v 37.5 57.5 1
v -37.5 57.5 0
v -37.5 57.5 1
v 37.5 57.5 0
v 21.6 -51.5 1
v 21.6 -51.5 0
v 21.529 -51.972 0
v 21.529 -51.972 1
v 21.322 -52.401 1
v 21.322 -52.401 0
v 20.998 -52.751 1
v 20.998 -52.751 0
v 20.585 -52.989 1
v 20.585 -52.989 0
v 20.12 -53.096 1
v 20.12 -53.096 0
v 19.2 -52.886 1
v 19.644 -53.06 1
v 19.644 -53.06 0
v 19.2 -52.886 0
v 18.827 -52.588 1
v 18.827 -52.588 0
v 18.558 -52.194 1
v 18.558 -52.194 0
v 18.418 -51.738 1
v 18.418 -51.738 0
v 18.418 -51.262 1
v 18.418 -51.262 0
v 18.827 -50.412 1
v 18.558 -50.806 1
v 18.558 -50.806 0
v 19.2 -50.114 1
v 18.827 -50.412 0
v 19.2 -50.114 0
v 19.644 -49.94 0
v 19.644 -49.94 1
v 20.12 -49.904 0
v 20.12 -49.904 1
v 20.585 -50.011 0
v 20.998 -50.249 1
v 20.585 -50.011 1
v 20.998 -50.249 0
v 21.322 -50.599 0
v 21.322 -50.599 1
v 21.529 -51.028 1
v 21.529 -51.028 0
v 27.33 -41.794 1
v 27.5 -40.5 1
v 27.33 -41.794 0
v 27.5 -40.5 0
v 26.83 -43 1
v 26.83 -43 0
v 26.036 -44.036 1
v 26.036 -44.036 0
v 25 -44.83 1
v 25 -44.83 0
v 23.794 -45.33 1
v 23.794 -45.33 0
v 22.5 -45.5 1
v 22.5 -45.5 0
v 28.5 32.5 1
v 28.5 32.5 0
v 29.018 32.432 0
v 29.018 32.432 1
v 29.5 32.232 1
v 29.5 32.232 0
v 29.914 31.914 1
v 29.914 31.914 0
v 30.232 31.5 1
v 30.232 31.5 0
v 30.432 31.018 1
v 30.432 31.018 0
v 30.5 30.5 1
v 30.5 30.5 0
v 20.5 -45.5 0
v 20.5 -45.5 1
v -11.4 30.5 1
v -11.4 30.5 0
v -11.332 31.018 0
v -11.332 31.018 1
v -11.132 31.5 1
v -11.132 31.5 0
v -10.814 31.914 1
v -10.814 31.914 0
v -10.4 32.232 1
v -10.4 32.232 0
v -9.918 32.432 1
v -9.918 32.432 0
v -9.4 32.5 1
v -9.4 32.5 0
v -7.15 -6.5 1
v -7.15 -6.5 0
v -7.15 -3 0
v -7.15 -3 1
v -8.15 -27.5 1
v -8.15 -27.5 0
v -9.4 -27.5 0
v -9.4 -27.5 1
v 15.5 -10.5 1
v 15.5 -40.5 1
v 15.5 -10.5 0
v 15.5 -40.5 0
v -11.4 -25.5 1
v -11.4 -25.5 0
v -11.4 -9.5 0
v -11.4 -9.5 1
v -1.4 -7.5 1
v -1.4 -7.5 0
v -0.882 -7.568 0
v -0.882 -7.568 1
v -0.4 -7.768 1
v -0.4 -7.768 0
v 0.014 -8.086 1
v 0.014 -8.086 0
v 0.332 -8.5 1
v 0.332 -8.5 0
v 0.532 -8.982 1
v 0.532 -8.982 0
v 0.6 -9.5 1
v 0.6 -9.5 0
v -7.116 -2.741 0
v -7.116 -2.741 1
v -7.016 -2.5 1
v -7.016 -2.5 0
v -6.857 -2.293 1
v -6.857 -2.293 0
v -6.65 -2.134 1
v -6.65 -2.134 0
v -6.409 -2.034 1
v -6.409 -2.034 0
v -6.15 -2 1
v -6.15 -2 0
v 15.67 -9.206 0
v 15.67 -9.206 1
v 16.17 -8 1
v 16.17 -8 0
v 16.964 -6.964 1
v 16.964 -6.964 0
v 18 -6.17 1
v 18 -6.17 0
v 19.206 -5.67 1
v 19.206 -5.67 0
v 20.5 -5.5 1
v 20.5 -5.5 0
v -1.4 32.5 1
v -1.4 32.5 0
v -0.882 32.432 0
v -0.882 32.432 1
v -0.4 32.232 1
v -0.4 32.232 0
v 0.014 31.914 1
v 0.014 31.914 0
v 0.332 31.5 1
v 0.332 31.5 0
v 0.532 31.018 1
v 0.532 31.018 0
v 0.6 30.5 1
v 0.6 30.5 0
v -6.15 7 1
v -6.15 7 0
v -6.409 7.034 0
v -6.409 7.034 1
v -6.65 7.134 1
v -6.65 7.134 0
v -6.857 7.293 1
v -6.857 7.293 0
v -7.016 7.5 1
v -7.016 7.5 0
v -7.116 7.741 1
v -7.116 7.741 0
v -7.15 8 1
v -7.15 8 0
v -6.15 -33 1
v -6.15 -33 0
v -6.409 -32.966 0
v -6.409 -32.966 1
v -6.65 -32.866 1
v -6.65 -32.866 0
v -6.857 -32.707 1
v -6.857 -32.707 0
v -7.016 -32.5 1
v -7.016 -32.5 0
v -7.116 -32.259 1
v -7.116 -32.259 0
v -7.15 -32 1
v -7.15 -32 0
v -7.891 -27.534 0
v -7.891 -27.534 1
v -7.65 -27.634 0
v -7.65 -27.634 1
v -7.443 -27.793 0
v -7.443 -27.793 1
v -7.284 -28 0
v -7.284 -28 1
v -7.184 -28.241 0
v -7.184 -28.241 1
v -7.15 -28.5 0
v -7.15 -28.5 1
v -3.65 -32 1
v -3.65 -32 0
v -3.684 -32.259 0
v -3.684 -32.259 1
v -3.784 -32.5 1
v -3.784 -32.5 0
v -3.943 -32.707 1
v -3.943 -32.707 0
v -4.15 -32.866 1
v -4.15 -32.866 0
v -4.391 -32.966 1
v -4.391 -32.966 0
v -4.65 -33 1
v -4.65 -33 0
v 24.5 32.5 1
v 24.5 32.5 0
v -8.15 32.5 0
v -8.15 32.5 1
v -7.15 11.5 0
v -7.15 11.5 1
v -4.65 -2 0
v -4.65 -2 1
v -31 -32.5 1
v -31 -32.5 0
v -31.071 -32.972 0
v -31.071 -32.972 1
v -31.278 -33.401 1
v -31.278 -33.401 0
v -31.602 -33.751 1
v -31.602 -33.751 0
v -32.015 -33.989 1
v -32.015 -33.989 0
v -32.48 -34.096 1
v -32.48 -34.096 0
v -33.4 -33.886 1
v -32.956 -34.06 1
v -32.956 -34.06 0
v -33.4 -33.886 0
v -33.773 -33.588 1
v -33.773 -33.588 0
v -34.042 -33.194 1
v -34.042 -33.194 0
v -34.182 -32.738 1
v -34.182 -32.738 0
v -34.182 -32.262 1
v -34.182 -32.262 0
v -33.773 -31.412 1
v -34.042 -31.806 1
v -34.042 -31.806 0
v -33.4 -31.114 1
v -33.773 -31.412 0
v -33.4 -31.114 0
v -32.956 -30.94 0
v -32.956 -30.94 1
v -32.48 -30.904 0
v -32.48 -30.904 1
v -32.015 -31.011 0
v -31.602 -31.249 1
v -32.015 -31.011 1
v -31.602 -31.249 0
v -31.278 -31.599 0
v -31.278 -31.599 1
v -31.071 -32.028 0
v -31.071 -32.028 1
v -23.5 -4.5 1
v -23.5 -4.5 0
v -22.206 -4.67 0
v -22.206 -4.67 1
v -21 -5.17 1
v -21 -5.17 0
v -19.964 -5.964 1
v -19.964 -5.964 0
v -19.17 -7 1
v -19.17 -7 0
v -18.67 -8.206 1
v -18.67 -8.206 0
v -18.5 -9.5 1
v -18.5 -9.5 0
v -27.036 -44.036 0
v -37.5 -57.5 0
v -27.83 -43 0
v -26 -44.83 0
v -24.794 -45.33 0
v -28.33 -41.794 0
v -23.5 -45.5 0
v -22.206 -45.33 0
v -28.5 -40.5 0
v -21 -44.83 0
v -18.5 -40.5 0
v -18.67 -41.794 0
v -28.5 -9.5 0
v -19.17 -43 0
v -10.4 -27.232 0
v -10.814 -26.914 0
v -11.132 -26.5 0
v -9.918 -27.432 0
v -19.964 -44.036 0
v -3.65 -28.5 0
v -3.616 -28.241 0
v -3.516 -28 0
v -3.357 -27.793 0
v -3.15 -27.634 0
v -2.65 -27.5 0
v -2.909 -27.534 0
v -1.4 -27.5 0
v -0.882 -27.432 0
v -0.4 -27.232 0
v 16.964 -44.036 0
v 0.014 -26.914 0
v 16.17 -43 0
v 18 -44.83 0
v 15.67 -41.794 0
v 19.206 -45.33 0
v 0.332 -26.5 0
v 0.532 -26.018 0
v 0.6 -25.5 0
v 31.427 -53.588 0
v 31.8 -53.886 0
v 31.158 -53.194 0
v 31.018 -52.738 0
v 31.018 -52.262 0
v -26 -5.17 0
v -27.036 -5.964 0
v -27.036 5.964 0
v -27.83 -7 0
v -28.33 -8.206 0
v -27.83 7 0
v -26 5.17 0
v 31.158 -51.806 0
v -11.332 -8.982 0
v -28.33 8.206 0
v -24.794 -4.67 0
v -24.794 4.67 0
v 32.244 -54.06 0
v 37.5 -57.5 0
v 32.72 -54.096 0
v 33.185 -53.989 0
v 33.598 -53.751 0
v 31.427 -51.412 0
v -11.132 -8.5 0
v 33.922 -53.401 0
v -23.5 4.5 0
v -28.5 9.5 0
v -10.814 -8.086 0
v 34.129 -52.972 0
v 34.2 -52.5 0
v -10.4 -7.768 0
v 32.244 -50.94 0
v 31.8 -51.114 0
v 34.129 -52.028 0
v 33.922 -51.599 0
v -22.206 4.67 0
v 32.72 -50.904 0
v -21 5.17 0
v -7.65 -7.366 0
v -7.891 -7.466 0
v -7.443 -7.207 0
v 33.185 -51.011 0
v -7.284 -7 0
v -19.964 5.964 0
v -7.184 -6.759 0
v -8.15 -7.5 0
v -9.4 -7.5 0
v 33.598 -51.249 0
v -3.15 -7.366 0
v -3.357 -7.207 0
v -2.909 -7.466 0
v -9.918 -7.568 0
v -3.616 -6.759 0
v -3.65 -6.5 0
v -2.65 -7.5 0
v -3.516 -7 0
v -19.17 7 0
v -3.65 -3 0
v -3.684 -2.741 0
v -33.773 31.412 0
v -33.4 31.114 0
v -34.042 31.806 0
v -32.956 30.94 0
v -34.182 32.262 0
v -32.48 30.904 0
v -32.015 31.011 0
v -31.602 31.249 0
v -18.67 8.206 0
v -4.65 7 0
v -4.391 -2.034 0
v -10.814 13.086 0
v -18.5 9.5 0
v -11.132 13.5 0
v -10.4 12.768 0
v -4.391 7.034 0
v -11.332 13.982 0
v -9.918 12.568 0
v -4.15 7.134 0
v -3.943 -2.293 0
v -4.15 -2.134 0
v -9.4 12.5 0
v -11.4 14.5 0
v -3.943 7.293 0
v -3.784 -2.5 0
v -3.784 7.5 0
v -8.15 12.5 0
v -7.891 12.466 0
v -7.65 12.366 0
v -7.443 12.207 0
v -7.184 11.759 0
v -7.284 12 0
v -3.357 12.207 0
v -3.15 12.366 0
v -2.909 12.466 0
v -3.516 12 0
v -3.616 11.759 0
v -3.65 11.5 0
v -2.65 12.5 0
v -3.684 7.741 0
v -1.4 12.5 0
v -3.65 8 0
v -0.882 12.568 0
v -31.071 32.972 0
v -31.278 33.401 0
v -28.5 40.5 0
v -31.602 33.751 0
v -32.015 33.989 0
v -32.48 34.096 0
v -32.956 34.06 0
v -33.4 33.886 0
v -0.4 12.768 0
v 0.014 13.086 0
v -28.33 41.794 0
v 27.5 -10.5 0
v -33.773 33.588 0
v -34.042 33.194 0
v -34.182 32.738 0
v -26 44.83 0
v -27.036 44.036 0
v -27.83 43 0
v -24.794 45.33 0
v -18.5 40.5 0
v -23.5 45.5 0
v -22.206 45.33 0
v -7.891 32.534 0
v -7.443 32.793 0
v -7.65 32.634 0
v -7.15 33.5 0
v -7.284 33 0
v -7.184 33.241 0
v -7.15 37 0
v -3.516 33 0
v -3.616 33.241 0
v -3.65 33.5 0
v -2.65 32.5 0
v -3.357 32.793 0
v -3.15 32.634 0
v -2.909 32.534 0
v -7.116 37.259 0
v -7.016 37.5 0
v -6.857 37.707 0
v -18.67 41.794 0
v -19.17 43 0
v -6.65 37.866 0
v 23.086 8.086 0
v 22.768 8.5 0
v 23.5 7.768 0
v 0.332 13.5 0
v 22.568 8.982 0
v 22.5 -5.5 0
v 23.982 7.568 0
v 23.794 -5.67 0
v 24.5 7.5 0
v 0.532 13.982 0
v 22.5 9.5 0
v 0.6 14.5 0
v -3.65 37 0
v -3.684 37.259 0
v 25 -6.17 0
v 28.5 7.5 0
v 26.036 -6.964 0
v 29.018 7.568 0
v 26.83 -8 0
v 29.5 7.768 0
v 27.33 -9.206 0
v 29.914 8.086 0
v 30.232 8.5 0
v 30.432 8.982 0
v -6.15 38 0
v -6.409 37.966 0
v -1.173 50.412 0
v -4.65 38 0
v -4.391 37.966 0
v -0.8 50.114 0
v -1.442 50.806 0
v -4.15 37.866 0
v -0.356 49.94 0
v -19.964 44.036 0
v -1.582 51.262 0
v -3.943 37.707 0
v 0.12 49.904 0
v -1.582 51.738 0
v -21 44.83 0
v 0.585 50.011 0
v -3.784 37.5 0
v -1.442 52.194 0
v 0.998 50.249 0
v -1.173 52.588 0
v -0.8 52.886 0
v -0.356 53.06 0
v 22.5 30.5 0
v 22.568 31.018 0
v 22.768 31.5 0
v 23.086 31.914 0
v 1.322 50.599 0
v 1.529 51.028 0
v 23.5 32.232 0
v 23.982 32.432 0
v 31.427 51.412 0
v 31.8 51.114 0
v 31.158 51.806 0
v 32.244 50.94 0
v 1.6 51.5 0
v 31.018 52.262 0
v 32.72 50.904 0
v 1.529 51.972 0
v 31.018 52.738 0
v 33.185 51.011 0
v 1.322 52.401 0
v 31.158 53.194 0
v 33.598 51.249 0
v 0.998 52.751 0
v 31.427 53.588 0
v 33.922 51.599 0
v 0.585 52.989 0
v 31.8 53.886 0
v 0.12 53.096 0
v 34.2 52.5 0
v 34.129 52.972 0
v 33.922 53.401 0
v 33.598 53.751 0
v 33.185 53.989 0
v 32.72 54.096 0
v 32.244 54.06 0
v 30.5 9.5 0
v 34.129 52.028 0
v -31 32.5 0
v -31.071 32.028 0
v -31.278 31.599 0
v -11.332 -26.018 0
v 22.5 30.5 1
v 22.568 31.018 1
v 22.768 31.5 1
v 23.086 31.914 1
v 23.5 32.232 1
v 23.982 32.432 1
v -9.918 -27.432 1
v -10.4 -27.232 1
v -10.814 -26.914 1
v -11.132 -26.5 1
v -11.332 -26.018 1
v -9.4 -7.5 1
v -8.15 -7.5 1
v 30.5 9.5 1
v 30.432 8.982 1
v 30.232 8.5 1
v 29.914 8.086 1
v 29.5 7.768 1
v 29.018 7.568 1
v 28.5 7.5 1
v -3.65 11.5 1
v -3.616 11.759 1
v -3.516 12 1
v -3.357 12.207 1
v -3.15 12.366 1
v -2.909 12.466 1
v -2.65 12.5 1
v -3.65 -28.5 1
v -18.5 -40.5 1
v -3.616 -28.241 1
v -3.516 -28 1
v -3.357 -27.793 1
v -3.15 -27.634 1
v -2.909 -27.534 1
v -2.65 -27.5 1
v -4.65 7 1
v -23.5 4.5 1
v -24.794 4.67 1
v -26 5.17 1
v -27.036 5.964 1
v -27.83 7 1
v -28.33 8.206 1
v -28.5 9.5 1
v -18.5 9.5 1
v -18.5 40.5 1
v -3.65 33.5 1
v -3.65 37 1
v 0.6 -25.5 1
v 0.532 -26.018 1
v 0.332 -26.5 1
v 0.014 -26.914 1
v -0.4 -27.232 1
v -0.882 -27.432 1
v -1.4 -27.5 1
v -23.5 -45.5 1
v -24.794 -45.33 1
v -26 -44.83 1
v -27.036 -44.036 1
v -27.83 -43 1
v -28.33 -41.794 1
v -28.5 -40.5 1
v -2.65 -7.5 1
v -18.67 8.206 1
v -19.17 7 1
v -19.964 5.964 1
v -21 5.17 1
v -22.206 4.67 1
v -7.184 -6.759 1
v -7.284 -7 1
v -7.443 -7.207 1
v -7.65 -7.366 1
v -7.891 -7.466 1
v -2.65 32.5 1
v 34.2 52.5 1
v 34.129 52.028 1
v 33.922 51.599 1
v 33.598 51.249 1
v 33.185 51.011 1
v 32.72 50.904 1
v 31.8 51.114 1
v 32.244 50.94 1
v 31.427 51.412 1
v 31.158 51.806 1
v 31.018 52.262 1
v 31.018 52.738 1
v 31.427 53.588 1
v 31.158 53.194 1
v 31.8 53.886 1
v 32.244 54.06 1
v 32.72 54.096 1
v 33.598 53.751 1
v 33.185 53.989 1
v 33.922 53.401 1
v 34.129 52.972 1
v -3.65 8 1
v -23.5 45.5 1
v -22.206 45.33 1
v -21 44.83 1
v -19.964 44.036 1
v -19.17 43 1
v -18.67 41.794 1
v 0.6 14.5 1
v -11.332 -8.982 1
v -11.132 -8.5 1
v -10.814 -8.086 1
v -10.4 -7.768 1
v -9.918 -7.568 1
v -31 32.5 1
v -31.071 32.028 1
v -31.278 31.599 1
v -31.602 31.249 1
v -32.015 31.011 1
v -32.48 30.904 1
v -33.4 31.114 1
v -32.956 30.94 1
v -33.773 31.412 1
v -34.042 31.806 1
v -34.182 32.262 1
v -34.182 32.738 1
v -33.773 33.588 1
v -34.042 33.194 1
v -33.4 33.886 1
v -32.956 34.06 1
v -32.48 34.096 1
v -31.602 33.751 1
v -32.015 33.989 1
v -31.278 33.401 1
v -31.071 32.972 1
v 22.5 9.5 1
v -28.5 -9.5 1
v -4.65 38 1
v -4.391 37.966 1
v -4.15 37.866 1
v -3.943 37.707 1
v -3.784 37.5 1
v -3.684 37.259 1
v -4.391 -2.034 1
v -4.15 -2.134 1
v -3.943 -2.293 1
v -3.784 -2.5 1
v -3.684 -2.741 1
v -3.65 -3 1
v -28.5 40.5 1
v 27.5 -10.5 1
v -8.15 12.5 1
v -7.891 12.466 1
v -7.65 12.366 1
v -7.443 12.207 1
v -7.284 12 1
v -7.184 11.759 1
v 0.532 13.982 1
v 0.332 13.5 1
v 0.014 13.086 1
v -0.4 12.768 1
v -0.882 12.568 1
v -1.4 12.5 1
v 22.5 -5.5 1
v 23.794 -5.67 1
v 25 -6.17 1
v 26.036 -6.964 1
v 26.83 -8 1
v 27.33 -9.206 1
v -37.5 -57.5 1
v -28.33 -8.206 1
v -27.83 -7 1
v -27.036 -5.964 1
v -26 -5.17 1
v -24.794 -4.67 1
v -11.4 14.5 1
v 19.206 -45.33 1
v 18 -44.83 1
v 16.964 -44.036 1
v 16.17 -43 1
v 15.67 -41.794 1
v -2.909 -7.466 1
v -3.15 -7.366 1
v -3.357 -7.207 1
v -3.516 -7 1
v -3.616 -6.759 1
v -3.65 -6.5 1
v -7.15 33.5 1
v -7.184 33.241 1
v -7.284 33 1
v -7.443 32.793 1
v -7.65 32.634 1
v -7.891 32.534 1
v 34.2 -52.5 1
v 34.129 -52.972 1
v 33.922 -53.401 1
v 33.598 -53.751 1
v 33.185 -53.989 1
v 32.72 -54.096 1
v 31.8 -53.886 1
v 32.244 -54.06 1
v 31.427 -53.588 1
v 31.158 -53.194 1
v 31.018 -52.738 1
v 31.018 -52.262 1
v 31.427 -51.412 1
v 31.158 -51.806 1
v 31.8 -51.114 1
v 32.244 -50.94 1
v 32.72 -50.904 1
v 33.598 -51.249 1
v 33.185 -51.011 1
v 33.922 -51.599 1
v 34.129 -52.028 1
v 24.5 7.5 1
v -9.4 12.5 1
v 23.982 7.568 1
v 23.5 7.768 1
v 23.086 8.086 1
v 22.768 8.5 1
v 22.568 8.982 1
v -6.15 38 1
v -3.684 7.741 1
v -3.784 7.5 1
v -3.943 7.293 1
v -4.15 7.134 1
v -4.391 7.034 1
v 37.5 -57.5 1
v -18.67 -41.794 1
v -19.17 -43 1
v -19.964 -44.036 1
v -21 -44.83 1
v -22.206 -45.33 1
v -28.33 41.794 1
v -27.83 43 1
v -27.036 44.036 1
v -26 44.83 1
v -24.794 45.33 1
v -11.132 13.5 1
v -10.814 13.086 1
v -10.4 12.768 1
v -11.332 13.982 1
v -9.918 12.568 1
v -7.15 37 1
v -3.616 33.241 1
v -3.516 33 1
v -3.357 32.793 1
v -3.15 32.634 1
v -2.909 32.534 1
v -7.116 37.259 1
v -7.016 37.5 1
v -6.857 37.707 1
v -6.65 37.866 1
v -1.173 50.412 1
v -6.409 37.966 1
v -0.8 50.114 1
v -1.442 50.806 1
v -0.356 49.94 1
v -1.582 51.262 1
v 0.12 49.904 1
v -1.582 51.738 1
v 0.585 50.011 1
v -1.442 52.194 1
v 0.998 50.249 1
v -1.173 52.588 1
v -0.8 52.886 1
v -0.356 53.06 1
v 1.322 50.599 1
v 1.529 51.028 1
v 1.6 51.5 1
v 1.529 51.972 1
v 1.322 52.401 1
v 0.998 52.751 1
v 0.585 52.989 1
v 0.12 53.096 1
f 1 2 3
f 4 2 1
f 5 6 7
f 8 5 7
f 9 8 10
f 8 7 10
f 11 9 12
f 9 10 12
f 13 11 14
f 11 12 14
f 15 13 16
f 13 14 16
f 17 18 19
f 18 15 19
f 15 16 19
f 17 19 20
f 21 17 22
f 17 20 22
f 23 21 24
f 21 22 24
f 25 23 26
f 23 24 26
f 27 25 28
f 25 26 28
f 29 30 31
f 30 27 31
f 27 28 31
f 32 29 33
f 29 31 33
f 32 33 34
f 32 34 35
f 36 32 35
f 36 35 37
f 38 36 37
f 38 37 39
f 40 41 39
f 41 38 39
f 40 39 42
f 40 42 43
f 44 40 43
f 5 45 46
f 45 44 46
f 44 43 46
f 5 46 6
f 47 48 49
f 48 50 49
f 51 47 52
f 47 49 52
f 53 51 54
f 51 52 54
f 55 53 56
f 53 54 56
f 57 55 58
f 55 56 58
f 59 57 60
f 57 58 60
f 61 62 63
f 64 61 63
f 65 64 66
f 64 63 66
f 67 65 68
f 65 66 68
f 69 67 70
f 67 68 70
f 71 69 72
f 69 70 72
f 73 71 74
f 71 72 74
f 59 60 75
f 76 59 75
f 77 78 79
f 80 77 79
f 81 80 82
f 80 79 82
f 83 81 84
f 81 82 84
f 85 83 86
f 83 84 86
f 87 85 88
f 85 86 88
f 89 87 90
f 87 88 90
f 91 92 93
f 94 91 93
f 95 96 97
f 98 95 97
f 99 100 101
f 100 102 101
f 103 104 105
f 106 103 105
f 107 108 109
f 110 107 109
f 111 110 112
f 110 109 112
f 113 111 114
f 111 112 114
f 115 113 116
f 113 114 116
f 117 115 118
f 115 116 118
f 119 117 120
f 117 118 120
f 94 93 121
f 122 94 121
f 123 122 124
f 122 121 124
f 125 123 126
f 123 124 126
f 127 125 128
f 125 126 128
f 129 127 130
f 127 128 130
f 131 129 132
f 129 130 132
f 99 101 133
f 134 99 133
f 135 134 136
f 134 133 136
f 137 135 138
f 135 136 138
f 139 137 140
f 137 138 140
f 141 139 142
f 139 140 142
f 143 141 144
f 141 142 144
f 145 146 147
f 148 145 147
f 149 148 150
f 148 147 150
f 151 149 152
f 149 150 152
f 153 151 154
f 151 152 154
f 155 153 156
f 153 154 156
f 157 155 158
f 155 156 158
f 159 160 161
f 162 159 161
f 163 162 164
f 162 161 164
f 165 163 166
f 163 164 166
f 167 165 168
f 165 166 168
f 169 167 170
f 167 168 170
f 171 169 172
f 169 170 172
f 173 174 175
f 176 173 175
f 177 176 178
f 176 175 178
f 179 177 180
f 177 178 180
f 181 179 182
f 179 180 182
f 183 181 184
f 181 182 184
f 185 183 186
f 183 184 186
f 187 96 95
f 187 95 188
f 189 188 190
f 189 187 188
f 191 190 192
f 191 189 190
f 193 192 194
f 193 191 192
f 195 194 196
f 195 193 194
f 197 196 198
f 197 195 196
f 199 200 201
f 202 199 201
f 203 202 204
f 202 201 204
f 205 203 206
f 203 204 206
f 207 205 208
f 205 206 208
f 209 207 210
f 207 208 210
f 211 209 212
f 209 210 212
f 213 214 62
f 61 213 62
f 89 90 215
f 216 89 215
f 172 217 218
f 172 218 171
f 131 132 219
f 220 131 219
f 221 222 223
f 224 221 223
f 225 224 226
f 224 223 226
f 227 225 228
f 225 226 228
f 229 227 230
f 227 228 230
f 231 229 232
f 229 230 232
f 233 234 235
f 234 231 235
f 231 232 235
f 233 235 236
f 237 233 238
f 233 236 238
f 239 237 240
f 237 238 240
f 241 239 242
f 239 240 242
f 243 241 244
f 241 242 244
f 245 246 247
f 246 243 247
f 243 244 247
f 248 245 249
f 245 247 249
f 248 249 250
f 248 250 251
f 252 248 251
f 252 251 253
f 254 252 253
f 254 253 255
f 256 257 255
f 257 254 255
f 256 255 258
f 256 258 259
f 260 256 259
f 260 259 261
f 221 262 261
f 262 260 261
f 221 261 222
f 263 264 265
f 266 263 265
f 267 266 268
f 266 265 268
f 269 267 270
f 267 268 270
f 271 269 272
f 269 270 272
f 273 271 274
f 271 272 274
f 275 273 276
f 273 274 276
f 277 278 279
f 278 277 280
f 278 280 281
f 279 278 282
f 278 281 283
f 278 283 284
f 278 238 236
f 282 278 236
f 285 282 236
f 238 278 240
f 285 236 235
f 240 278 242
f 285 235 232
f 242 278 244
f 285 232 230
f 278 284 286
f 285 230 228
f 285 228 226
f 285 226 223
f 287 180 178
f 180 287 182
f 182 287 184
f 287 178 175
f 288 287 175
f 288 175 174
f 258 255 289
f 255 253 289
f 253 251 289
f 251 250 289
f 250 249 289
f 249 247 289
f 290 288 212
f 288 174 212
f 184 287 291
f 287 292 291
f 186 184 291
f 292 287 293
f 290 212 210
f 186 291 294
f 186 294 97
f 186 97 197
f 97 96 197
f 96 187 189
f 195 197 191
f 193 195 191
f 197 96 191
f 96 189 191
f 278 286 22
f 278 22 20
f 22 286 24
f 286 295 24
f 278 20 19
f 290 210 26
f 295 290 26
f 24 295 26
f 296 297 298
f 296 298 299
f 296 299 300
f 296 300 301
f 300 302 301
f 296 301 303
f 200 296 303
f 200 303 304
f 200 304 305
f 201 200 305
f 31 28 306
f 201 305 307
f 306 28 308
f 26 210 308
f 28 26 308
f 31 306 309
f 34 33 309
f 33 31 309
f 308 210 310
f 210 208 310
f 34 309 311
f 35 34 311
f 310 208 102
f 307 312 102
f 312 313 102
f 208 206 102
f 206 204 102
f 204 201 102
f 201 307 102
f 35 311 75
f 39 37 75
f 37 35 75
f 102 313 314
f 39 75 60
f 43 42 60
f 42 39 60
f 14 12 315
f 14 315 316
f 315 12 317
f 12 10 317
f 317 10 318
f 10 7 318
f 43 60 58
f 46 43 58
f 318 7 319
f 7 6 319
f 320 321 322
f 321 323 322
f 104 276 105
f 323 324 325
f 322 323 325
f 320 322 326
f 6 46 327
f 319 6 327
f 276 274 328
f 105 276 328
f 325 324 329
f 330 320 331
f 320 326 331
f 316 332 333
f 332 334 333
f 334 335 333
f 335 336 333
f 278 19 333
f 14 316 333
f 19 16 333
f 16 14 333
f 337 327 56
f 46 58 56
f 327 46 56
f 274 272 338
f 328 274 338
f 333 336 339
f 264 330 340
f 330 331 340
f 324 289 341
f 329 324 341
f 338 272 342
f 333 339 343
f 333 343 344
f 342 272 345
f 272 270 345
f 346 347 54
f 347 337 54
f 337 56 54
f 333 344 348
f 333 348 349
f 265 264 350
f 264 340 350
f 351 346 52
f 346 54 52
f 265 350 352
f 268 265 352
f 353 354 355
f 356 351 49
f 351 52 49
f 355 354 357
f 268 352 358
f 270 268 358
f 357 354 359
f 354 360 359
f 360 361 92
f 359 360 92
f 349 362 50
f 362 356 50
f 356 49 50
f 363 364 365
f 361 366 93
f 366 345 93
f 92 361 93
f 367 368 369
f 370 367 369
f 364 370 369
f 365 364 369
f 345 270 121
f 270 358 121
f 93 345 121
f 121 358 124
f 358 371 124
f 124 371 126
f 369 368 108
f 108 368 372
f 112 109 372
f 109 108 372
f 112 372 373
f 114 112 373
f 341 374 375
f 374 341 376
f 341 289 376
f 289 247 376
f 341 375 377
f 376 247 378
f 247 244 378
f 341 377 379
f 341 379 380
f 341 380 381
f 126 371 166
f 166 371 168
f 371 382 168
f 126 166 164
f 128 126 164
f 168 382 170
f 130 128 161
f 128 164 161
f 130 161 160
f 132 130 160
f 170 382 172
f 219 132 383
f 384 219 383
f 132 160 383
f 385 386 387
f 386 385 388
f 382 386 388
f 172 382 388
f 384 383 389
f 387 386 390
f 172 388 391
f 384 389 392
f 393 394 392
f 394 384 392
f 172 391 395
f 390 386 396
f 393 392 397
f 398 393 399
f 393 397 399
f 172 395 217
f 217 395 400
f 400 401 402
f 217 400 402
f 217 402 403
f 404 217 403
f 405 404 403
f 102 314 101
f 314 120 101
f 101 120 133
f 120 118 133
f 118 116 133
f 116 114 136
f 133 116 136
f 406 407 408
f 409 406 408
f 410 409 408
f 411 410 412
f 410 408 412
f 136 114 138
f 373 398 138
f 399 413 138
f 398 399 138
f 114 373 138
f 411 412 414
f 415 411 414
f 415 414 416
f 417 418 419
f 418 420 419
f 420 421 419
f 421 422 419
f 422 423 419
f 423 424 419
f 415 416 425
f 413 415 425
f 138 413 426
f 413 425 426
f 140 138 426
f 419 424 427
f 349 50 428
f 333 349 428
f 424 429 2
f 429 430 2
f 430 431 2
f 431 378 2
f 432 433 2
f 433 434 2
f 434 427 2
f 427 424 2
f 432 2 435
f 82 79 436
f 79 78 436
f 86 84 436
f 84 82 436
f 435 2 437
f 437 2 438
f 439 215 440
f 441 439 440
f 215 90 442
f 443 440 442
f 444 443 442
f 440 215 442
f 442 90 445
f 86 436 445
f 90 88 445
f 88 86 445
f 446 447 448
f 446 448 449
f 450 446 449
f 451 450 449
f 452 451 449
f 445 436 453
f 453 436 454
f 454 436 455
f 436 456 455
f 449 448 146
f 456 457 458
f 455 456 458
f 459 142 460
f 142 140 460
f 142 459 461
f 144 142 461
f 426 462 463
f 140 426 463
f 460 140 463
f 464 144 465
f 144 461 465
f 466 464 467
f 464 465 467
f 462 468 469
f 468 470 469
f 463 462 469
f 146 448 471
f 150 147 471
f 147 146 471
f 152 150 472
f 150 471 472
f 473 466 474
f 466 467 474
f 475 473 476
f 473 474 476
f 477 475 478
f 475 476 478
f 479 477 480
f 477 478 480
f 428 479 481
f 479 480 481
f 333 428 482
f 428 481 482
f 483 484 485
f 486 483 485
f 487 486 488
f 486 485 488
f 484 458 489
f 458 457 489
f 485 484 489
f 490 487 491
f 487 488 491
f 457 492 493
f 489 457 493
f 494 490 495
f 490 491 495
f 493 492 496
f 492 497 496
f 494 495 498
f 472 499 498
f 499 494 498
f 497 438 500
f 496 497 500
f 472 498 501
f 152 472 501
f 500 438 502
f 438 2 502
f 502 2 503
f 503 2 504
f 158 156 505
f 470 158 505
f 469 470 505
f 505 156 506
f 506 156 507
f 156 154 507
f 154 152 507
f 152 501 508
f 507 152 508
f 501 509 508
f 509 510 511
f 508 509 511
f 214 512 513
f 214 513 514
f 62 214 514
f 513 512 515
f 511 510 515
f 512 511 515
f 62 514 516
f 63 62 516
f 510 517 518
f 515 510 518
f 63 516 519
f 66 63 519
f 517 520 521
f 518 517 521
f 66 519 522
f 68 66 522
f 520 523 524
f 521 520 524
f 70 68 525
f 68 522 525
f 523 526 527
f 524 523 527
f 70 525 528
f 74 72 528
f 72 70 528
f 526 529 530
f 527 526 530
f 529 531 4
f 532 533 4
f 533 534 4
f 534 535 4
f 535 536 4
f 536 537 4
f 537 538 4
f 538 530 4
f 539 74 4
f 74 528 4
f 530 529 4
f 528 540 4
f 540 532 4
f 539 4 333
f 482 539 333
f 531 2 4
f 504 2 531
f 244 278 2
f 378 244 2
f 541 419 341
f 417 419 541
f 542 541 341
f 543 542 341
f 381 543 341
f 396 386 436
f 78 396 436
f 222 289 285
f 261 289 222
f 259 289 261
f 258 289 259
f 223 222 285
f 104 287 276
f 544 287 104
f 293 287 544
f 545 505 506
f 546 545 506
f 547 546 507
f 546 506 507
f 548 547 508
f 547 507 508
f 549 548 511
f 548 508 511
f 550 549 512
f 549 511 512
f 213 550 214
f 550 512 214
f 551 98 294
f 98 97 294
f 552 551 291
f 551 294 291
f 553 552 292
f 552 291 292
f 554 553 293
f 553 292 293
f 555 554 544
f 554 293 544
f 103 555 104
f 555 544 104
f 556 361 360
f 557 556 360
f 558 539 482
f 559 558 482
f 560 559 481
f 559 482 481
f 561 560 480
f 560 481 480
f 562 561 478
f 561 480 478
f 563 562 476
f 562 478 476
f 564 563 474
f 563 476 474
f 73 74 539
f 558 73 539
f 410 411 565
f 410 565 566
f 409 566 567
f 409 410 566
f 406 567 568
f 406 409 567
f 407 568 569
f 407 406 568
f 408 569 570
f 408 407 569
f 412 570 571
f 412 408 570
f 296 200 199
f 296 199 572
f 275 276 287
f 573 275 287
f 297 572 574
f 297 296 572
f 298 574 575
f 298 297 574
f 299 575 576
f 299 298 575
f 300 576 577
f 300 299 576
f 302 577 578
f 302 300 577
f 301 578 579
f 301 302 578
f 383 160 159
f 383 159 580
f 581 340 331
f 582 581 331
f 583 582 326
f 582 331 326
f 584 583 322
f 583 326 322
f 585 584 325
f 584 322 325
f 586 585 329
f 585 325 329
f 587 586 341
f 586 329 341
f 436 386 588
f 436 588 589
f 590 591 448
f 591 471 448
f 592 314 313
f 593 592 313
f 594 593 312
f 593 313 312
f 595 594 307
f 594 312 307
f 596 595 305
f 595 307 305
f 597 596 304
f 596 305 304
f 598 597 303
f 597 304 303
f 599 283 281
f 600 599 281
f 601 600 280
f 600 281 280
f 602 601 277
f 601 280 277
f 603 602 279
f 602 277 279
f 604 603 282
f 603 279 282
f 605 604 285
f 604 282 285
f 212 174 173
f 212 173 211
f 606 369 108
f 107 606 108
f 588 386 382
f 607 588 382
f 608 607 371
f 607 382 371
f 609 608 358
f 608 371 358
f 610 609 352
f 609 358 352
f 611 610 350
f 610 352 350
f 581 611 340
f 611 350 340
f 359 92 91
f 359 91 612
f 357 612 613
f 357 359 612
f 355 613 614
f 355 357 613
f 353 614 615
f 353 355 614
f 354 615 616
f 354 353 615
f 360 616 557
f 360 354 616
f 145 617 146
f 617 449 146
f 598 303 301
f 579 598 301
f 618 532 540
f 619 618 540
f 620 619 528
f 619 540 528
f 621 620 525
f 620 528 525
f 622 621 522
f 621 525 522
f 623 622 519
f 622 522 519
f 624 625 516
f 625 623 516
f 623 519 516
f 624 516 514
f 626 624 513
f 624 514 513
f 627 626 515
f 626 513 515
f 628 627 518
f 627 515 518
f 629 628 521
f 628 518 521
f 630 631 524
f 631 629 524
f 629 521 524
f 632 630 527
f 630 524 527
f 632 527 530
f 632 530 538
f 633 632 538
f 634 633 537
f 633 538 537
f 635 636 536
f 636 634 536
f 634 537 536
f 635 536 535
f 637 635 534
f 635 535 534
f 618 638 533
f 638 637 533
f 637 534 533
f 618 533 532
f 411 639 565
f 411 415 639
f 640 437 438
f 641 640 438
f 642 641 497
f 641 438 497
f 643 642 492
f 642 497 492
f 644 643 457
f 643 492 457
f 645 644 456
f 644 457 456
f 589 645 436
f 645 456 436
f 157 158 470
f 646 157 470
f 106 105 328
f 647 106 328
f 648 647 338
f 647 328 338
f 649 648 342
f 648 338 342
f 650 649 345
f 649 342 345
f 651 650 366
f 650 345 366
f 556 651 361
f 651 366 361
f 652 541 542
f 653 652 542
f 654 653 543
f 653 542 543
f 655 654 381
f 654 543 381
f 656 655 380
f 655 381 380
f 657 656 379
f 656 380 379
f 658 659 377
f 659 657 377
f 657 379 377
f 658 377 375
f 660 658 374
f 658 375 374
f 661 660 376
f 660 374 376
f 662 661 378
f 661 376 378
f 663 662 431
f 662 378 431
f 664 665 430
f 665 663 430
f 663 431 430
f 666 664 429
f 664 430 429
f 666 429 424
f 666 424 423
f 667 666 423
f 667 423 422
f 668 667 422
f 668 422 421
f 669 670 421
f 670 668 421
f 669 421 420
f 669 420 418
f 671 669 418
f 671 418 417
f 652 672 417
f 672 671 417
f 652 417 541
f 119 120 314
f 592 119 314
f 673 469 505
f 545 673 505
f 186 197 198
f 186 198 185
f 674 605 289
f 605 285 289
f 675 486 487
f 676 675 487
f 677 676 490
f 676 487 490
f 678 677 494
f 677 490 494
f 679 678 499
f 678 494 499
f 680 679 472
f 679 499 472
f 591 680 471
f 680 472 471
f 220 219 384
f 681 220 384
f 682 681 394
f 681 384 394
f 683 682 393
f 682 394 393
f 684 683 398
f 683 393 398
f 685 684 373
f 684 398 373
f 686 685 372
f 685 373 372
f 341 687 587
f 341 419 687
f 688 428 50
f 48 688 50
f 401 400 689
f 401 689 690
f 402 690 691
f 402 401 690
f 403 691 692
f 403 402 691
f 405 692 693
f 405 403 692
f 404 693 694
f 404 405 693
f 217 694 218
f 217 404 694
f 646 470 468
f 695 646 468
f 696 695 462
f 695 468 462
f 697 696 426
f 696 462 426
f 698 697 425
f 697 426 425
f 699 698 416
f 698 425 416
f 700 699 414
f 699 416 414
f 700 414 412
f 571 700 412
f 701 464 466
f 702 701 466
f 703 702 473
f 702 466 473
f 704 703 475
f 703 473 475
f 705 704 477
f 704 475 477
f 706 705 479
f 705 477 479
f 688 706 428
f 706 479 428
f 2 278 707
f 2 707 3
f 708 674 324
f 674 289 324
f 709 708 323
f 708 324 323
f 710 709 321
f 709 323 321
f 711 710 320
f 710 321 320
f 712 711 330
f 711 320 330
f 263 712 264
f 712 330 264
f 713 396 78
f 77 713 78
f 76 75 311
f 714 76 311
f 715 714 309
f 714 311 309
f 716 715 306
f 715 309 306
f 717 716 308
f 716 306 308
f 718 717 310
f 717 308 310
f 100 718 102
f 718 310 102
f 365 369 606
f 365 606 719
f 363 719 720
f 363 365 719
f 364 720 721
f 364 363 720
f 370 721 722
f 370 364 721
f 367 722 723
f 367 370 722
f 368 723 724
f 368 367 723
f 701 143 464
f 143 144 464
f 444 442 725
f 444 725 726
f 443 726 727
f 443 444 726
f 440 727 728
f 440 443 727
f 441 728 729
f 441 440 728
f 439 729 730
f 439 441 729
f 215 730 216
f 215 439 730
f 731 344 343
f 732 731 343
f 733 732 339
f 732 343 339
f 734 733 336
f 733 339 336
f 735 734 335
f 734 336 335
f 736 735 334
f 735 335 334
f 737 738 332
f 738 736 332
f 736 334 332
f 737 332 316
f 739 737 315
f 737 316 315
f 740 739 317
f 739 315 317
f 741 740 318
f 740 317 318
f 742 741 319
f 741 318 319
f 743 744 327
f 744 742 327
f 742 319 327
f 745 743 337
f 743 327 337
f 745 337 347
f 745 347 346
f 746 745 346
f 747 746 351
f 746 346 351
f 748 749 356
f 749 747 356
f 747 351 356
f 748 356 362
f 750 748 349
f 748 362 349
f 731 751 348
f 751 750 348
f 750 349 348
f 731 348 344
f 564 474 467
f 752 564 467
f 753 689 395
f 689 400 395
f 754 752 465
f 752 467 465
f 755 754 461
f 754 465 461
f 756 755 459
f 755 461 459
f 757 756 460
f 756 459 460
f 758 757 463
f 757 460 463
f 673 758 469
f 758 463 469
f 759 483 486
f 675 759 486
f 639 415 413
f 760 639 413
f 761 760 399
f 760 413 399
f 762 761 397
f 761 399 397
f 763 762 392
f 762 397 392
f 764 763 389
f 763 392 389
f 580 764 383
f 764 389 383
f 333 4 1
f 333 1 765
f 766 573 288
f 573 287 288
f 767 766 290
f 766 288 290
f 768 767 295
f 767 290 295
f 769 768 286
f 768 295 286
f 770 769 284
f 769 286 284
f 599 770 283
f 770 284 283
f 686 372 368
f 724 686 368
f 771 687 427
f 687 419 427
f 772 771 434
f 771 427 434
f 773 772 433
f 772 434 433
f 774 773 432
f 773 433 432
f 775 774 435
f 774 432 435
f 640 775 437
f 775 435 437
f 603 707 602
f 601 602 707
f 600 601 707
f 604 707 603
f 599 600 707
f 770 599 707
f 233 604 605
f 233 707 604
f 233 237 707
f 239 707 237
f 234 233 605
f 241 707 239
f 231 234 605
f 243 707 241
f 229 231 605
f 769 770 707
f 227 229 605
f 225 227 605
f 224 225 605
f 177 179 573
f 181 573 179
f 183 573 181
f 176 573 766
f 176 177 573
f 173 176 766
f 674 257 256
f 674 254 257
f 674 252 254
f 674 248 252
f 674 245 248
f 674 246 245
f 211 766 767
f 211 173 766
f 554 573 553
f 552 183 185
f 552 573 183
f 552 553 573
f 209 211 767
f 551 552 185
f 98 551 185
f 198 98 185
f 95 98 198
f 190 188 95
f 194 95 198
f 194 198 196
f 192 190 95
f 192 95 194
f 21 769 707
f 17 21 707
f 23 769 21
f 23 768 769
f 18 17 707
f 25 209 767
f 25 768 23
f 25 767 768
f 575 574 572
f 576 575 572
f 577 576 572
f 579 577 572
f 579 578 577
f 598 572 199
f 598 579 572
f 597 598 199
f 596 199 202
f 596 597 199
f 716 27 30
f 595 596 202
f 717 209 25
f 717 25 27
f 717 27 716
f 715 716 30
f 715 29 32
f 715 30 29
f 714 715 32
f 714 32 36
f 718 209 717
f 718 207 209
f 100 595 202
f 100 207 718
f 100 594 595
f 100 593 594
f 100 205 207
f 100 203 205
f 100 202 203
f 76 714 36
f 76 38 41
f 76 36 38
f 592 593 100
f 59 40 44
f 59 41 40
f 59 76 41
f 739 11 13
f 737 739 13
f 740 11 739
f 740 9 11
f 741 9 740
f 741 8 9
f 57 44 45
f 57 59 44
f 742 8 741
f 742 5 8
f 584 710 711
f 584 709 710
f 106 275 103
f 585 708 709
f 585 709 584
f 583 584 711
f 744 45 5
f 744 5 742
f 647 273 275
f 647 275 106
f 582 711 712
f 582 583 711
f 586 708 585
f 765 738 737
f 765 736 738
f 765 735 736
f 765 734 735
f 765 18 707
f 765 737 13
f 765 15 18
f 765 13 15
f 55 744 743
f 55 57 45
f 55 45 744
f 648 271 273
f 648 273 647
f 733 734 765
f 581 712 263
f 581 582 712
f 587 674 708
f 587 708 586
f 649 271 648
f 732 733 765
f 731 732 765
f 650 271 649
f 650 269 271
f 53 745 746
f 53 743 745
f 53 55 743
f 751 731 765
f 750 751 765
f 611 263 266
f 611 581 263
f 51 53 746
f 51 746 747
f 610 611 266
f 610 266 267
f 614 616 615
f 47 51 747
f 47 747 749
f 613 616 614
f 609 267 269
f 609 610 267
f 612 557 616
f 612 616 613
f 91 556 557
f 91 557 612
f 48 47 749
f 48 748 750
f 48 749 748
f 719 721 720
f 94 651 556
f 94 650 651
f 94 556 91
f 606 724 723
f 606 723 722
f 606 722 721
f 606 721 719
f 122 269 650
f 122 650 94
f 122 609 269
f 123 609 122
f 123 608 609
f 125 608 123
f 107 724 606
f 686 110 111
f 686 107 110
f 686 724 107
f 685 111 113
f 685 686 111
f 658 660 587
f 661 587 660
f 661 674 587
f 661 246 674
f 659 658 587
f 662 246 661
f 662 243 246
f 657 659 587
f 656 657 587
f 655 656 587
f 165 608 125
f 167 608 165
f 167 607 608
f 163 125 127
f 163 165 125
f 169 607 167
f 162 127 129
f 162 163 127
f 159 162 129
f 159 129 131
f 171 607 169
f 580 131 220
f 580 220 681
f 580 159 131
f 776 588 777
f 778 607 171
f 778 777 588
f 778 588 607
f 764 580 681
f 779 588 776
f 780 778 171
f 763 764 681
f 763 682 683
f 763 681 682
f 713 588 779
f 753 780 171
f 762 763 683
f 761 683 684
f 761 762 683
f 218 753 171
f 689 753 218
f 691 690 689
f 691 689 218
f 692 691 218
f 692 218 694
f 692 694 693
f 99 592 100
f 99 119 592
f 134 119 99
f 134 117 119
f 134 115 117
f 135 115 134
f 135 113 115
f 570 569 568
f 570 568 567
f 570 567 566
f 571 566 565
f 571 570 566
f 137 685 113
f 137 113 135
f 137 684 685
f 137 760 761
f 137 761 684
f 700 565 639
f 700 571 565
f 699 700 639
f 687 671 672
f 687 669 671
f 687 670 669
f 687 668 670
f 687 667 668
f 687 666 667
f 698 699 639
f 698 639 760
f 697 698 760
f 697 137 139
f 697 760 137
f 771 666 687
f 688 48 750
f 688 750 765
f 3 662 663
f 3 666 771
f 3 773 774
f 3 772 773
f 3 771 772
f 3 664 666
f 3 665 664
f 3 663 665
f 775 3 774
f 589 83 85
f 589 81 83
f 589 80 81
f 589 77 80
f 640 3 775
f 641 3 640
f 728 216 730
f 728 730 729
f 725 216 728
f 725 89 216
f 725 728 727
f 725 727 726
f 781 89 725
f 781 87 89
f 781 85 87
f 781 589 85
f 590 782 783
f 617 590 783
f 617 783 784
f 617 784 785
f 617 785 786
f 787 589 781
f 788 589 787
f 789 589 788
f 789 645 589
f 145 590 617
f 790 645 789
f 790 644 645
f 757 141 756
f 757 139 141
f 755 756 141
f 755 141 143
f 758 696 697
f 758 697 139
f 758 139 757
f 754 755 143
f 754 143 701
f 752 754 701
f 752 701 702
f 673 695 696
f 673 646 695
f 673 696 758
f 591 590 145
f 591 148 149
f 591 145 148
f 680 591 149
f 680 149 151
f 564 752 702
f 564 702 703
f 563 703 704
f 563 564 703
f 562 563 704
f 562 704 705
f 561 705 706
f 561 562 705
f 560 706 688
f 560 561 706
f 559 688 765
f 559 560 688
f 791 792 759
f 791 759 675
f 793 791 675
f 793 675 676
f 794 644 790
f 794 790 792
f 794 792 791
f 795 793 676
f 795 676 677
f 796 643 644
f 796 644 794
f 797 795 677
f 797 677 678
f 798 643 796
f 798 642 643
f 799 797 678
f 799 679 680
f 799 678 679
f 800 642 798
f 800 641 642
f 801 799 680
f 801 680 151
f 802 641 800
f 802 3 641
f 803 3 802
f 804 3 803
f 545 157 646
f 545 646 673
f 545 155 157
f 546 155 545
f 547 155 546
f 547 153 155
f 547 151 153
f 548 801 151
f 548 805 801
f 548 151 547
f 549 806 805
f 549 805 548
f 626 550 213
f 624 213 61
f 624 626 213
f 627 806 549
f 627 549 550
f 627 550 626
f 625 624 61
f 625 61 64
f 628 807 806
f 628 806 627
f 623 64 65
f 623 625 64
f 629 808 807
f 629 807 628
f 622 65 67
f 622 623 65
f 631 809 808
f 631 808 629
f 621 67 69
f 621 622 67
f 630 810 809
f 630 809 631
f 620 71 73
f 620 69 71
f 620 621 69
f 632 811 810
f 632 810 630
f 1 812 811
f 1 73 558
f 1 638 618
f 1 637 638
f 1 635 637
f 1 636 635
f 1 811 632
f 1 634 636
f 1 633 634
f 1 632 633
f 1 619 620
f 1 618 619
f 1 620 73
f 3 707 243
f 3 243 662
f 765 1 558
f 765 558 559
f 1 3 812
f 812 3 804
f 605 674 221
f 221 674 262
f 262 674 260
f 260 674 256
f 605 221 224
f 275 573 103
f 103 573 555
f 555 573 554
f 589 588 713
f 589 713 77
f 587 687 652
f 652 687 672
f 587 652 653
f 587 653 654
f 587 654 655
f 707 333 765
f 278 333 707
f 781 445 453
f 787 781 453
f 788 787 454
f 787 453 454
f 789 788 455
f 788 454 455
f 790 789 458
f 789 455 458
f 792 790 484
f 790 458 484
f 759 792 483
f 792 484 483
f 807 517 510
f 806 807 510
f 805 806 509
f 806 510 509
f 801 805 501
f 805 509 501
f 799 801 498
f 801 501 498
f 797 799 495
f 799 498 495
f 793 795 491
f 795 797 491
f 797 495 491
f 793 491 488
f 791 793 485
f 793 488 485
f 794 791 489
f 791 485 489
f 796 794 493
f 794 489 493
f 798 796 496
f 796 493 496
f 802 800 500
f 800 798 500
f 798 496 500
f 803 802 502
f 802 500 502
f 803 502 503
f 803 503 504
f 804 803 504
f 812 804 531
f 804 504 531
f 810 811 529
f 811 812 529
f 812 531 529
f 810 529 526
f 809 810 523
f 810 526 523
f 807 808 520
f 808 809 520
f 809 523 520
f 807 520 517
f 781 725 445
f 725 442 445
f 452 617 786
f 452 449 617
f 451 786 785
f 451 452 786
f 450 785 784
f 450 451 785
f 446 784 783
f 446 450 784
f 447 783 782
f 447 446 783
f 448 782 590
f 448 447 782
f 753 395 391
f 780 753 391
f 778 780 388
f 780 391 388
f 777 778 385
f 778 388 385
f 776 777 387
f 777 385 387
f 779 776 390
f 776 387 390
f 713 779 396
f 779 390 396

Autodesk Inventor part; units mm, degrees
ref_plane "YZ Plane" through (0, 0, 0) normal (1, 0, 0) x (0, 1, 0)
ref_plane "XZ Plane" through (0, 0, 0) normal (0, 1, 0) x (-1, 0, 0)
ref_plane "XY Plane" through (0, 0, 0) normal (0, 0, 1) x (1, 0, 0)
sketch "Sketch1" plane through (0, 0, 0) normal (0, 0, 1) x (1, 0, 0)
  line L0 (-37.5, 57.5) -> (37.5, 57.5)
  line L1 (37.5, 57.5) -> (37.5, -57.5)
  line L2 (37.5, -57.5) -> (-37.5, -57.5)
  line L3 (-37.5, -57.5) -> (-37.5, 57.5)
  line L4 (-37.5, 57.5) -> (37.5, -57.5) construction
  line L5 (37.5, 57.5) -> (-37.5, -57.5) construction
  line L6 (0, 0) -> (0, 12.9993)
  circle A0 centre (-32.6, -32.5) radius 1.6
  circle A1 centre (0, 51.5) radius 1.6
  line L7 (0, 0) -> (8.7382, 0)
  circle A2 centre (20, -51.5) radius 1.6
  circle A3 centre (-32.6, 32.5) radius 1.6
  circle A4 centre (32.6, 52.5) radius 1.6
  circle A5 centre (32.6, -52.5) radius 1.6
  line L8 (0.6, -9.5) -> (0.6, -25.5)
  line L9 (-11.4, -25.5) -> (-11.4, -9.5)
  line L10 (-11.4, -7.5) -> (0.6, -27.5) construction
  line L11 (0.6, -7.5) -> (-11.4, -27.5) construction
  line L12 (-6.15, -2) -> (-4.65, -2)
  line L13 (-3.65, -3) -> (-3.65, -6.5)
  line L14 (-7.15, -6.5) -> (-7.15, -3)
  line L15 (-7.15, -2) -> (-3.65, -7.5) construction
  line L16 (-3.65, -2) -> (-7.15, -7.5) construction
  line L17 (-6.15, -33) -> (-4.65, -33)
  line L18 (-3.65, -32) -> (-3.65, -28.5)
  line L19 (-7.15, -28.5) -> (-7.15, -32)
  line L20 (-7.15, -33) -> (-3.65, -27.5) construction
  line L21 (-3.65, -33) -> (-7.15, -27.5) construction
  line L22 (28.5, 7.5) -> (24.5, 7.5)
  line L23 (22.5, 9.5) -> (22.5, 30.5)
  line L24 (24.5, 32.5) -> (28.5, 32.5)
  line L25 (30.5, 30.5) -> (30.5, 9.5)
  line L26 (30.5, 7.5) -> (22.5, 32.5) construction
  line L27 (22.5, 7.5) -> (30.5, 32.5) construction
  line L28 (-23.5, -45.5) -> (-23.5, -45.5)
  line L29 (-28.5, -40.5) -> (-28.5, -9.5)
  line L30 (-23.5, -4.5) -> (-23.5, -4.5)
  line L31 (-18.5, -9.5) -> (-18.5, -40.5)
  line L32 (-18.5, -45.5) -> (-28.5, -4.5) construction
  line L33 (-28.5, -45.5) -> (-18.5, -4.5) construction
  arc A6 (-23.5, -45.5) -> (-18.5, -40.5) centre (-23.5, -40.5) ccw
  arc A7 (-18.5, -9.5) -> (-23.5, -4.5) centre (-23.5, -9.5) ccw
  arc A8 (-23.5, -4.5) -> (-28.5, -9.5) centre (-23.5, -9.5) ccw
  arc A9 (-28.5, -40.5) -> (-23.5, -45.5) centre (-23.5, -40.5) ccw
  line L34 (-23.5, 45.5) -> (-23.5, 45.5)
  line L35 (-28.5, 40.5) -> (-28.5, 9.5)
  line L36 (-23.5, 4.5) -> (-23.5, 4.5)
  line L37 (-18.5, 9.5) -> (-18.5, 40.5)
  line L38 (-18.5, 45.5) -> (-28.5, 4.5) construction
  line L39 (-28.5, 45.5) -> (-18.5, 4.5) construction
  arc A10 (-18.5, 40.5) -> (-23.5, 45.5) centre (-23.5, 40.5) ccw
  arc A11 (-23.5, 4.5) -> (-18.5, 9.5) centre (-23.5, 9.5) ccw
  arc A12 (-28.5, 9.5) -> (-23.5, 4.5) centre (-23.5, 9.5) ccw
  arc A13 (-23.5, 45.5) -> (-28.5, 40.5) centre (-23.5, 40.5) ccw
  line L40 (22.5, -45.5) -> (20.5, -45.5)
  line L41 (15.5, -40.5) -> (15.5, -10.5)
  line L42 (20.5, -5.5) -> (22.5, -5.5)
  line L43 (27.5, -10.5) -> (27.5, -40.5)
  line L44 (27.5, -45.5) -> (15.5, -5.5) construction
  line L45 (15.5, -45.5) -> (27.5, -5.5) construction
  arc A14 (22.5, -45.5) -> (27.5, -40.5) centre (22.5, -40.5) ccw
  arc A15 (15.5, -40.5) -> (20.5, -45.5) centre (20.5, -40.5) ccw
  arc A16 (27.5, -10.5) -> (22.5, -5.5) centre (22.5, -10.5) ccw
  arc A17 (20.5, -5.5) -> (15.5, -10.5) centre (20.5, -10.5) ccw
  arc A18 (-7.15, -32) -> (-6.15, -33) centre (-6.15, -32) ccw
  arc A19 (-4.65, -33) -> (-3.65, -32) centre (-4.65, -32) ccw
  arc A20 (-3.65, -3) -> (-4.65, -2) centre (-4.65, -3) ccw
  arc A21 (-6.15, -2) -> (-7.15, -3) centre (-6.15, -3) ccw
  line L46 (-9.4, -7.5) -> (-8.15, -7.5)
  line L47 (-2.65, -7.5) -> (-1.4, -7.5)
  line L48 (-1.4, -27.5) -> (-2.65, -27.5)
  line L49 (-8.15, -27.5) -> (-9.4, -27.5)
  arc A22 (-1.4, -27.5) -> (0.6, -25.5) centre (-1.4, -25.5) ccw
  arc A23 (0.6, -9.5) -> (-1.4, -7.5) centre (-1.4, -9.5) ccw
  arc A24 (-11.4, -25.5) -> (-9.4, -27.5) centre (-9.4, -25.5) ccw
  arc A25 (-9.4, -7.5) -> (-11.4, -9.5) centre (-9.4, -9.5) ccw
  arc A26 (-7.15, -28.5) -> (-8.15, -27.5) centre (-8.15, -28.5) ccw
  arc A27 (-2.65, -27.5) -> (-3.65, -28.5) centre (-2.65, -28.5) ccw
  arc A28 (-3.65, -6.5) -> (-2.65, -7.5) centre (-2.65, -6.5) ccw
  arc A29 (-8.15, -7.5) -> (-7.15, -6.5) centre (-8.15, -6.5) ccw
  line L50 (-7.15, 11.5) -> (-7.15, 8)
  arc A30 (-2.65, 12.5) -> (-3.65, 11.5) centre (-2.65, 11.5) ccw
  arc A31 (-1.4, 12.5) -> (0.6, 14.5) centre (-1.4, 14.5) ccw
  line L51 (-1.4, 12.5) -> (-2.65, 12.5)
  arc A32 (-7.15, 8) -> (-6.15, 7) centre (-6.15, 8) ccw
  line L52 (-7.15, 7) -> (-3.65, 12.5) construction
  line L53 (-3.65, 7) -> (-7.15, 12.5) construction
  line L54 (-3.65, 8) -> (-3.65, 11.5)
  line L55 (-6.15, 7) -> (-4.65, 7)
  arc A33 (-4.65, 7) -> (-3.65, 8) centre (-4.65, 8) ccw
  line L56 (-11.4, 14.5) -> (-11.4, 30.5)
  arc A34 (-7.15, 11.5) -> (-8.15, 12.5) centre (-8.15, 11.5) ccw
  line L57 (-8.15, 12.5) -> (-9.4, 12.5)
  arc A35 (-11.4, 14.5) -> (-9.4, 12.5) centre (-9.4, 14.5) ccw
  line L58 (-2.65, 32.5) -> (-1.4, 32.5)
  arc A36 (0.6, 30.5) -> (-1.4, 32.5) centre (-1.4, 30.5) ccw
  line L59 (-6.15, 38) -> (-4.65, 38)
  line L60 (-3.65, 37) -> (-3.65, 33.5)
  line L61 (-7.15, 33.5) -> (-7.15, 37)
  line L62 (-7.15, 38) -> (-3.65, 32.5) construction
  line L63 (-3.65, 38) -> (-7.15, 32.5) construction
  line L64 (-9.4, 32.5) -> (-8.15, 32.5)
  arc A37 (-8.15, 32.5) -> (-7.15, 33.5) centre (-8.15, 33.5) ccw
  arc A38 (-9.4, 32.5) -> (-11.4, 30.5) centre (-9.4, 30.5) ccw
  arc A39 (-6.15, 38) -> (-7.15, 37) centre (-6.15, 37) ccw
  arc A40 (-3.65, 37) -> (-4.65, 38) centre (-4.65, 37) ccw
  arc A41 (-3.65, 33.5) -> (-2.65, 32.5) centre (-2.65, 33.5) ccw
  line L65 (0.6, 30.5) -> (0.6, 14.5)
  line L66 (-11.4, 32.5) -> (0.6, 12.5) construction
  line L67 (0.6, 32.5) -> (-11.4, 12.5) construction
  arc A42 (24.5, 32.5) -> (22.5, 30.5) centre (24.5, 30.5) ccw
  arc A43 (30.5, 30.5) -> (28.5, 32.5) centre (28.5, 30.5) ccw
  arc A44 (28.5, 7.5) -> (30.5, 9.5) centre (28.5, 9.5) ccw
  arc A45 (22.5, 9.5) -> (24.5, 7.5) centre (24.5, 9.5) ccw
  point P0 (-5.4, -17.5)
  point P1 (-5.4, -4.75)
  point P2 (-5.4, -30.25)
  point P3 (26.5, 20)
  point P4 (-23.5, -25)
  point P5 (-23.5, 25)
  point P6 (21.5, -25.5)
  point P7 (-5.4, 9.75)
  point P8 (-5.4, 35.25)
  point P9 (-5.4, 22.5)
  point P10 (0, 57.5)
  point P11 (0, -57.5)
  point P12 (22.5, 20)
  dimension "d0" = 115
  dimension "d1" = 75
  dimension "d22" = 3.2
  dimension "d25" = 3.2
  dimension "d26" = 6
  dimension "d27" = 25
  dimension "d28" = 4.9
  dimension "d29" = 3.2
  dimension "d30" = 4.9
  dimension "d31" = 5
  dimension "d32" = 5.5
  dimension "d33" = 3.5
  dimension "d34" = 12
  dimension "d35" = 20
  dimension "d38" = 26.1
  dimension "d39" = 8
  dimension "d40" = 25
  dimension "d42" = 25
  dimension "d43" = 41
  dimension "d44" = 10
  dimension "d45" = 9
  dimension "d46" = 12
  dimension "d47" = 5
  dimension "d48" = 40
  dimension "d49" = 12
  dimension "d50" = 10
  dimension "d51" = 12
  dimension "d52" = 5
  dimension "d53" = 1
  dimension "d54" = 30
  dimension "d55" = 2
  dimension "d56" = 1
  dimension "d59" = 40
  dimension "d64" = 9
  dimension "d65" = 12
  dimension "d67" = 0
  dimension "d68" = 3.2
  dimension "d69" = 6
  dimension "d70" = 20
  dimension "d71" = 2
  dimension "d72" = 60
extrude "Plate1" add sketch "Sketch1" along normal blind 1
equation "\"d2\" = 厚度"
equation "\"折彎半徑\" = 厚度"
equation "\"折彎離隙寬度\" = 厚度"
equation "\"折彎離隙深度\" = 0.5 * 厚度"
equation "\"轉角離隙大小\" = 4 * 厚度"
equation "\"最小剩餘\" = 2 * 厚度"
equation "\"轉移半徑\" = 折彎半徑"
equation "\"Jacobi半徑大小\" = 折彎半徑"
equation "\"間隙大小\" = 厚度"
equation "\"厚度\" = 1"
properties part number "PCB_board_box_front" material "Aluminum"
